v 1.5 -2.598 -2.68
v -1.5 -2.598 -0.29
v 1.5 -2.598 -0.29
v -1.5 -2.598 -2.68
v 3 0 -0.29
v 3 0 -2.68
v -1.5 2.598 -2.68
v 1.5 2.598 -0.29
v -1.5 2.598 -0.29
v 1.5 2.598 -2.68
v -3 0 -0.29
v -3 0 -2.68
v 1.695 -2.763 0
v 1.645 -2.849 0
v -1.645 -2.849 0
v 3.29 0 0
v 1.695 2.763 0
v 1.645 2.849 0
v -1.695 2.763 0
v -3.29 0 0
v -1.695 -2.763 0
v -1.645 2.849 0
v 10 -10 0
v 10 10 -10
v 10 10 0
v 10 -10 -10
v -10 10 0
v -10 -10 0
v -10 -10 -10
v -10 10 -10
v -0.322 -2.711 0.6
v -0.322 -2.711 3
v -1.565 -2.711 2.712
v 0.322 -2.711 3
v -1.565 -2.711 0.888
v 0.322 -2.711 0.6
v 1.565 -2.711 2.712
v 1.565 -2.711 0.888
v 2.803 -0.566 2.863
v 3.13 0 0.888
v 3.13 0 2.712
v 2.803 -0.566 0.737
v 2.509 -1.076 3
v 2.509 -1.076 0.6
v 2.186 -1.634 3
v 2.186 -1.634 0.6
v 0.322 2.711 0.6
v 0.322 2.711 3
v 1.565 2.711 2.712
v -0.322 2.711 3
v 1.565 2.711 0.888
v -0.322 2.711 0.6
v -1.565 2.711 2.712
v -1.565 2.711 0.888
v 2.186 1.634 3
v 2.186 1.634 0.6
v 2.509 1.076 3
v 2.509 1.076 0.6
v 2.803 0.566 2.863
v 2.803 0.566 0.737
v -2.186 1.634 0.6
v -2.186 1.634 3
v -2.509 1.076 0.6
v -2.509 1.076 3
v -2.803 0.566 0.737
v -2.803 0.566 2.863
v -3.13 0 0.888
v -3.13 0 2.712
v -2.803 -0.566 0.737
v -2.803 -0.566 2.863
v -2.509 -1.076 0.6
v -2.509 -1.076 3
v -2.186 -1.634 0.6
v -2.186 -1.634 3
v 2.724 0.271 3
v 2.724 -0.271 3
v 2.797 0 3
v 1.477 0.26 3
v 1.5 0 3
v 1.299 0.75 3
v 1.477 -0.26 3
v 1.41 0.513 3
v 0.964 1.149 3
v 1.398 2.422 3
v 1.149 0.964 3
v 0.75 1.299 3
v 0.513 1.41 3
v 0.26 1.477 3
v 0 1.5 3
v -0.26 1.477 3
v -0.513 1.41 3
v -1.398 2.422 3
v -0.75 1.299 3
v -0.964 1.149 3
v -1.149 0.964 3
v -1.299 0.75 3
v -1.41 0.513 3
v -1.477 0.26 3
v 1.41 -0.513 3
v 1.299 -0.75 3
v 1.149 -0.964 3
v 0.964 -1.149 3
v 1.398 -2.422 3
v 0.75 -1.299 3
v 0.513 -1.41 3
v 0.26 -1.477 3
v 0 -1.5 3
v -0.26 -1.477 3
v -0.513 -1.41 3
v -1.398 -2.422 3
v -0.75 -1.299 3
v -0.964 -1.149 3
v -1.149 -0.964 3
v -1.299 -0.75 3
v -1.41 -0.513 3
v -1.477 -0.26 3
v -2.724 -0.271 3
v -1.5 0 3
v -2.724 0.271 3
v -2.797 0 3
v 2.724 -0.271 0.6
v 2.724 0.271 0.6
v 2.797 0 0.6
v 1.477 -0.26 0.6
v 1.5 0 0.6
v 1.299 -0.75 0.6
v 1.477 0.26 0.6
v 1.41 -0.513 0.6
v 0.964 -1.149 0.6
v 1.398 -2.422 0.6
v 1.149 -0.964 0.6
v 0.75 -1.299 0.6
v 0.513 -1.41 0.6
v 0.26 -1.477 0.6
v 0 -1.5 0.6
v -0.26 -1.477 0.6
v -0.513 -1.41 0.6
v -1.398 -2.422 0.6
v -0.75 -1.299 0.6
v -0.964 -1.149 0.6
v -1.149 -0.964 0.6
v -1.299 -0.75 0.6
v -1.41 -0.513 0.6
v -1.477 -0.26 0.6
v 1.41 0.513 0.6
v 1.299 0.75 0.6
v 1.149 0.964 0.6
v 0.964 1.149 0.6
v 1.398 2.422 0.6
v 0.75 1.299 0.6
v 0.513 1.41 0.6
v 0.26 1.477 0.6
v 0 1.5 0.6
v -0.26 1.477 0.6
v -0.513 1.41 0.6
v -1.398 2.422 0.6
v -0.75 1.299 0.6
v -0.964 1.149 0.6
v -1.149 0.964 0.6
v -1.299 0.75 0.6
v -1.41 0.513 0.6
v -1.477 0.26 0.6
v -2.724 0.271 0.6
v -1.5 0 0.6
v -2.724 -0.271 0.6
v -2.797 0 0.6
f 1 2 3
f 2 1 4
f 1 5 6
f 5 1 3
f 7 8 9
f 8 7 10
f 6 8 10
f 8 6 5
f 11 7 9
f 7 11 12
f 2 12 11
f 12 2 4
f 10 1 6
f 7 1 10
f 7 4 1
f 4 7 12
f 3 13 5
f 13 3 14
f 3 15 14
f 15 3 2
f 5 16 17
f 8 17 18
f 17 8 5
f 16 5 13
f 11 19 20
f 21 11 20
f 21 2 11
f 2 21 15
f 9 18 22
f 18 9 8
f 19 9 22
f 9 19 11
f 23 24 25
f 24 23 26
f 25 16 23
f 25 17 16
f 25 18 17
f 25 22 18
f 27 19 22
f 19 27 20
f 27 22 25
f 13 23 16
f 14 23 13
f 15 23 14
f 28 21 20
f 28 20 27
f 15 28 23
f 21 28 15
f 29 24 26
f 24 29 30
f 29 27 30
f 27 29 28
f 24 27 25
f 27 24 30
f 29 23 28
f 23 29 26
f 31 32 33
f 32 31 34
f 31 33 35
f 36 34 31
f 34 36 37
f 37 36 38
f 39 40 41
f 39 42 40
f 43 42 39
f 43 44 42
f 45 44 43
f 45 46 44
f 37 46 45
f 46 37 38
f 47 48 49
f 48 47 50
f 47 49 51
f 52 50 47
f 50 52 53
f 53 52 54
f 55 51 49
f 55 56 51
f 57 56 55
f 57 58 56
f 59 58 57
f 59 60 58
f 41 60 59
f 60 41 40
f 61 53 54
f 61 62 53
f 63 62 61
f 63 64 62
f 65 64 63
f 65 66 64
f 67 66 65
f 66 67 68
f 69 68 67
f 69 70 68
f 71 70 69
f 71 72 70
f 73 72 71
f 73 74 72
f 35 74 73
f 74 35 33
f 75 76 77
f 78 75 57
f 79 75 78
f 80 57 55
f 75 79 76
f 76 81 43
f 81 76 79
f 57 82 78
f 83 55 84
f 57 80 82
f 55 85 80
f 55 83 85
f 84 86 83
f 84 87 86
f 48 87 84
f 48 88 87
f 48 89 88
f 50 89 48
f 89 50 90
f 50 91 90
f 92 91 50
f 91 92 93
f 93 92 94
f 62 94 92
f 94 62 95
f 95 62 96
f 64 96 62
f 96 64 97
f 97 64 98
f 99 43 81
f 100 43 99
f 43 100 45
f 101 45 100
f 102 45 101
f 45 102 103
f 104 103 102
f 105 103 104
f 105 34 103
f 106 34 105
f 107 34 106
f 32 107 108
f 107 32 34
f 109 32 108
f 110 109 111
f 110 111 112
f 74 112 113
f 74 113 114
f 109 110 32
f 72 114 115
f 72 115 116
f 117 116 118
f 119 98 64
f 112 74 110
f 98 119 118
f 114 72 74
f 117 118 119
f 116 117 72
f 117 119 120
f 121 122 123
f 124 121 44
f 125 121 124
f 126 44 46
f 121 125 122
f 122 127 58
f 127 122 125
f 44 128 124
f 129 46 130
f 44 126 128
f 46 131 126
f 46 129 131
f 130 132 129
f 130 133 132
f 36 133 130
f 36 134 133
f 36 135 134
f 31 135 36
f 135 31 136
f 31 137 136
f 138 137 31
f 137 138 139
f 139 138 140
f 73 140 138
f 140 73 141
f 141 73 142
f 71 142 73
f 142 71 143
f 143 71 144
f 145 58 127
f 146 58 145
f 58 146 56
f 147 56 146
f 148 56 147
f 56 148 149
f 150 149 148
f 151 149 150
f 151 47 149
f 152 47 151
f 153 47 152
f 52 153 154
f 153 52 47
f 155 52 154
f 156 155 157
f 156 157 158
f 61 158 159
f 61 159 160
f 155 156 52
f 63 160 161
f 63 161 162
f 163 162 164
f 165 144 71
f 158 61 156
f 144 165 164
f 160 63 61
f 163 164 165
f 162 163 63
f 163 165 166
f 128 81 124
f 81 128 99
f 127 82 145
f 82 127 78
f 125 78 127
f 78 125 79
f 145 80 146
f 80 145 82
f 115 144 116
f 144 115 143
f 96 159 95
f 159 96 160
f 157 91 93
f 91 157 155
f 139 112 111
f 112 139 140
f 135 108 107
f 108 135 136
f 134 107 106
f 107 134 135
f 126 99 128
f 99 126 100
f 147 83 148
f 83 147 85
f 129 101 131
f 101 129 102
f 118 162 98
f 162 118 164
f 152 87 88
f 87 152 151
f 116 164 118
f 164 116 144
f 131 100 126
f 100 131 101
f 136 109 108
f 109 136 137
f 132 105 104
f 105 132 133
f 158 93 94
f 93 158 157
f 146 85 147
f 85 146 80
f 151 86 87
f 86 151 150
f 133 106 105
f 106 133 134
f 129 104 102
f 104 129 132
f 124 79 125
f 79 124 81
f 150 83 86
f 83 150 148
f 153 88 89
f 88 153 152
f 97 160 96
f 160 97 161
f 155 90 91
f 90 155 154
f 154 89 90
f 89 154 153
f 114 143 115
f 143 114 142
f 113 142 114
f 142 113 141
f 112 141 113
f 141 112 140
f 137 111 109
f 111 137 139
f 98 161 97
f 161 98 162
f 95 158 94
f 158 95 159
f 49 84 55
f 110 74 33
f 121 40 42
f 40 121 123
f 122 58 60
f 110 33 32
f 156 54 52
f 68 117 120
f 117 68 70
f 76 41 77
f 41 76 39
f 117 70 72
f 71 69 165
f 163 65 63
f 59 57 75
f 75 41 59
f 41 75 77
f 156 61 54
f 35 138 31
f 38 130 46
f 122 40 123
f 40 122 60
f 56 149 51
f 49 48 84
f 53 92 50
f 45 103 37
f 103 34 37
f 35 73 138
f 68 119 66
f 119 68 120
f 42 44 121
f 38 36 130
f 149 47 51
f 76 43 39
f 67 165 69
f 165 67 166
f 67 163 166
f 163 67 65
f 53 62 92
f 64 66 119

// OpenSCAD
fn = 36;

module M3(length) {
   color("DimGray")
	union(){
	translate([0, 0, 0]) cylinder(h = length, r = 1.5, center = false, $fn = fn);
	render() difference() {
		translate([0, 0, length]) cylinder(h = 3, r = 2.8, center = false, $fn = fn);
		translate([0, 0, length + 1.71]) cylinder(h = 1.3, r = 1.25, center = false, $fn = 6);
	}
  }
}


module M3Hole() {
  translate([0, 0, 2.0]) cylinder(h=3.03, d=6, $fn = fn);	
  translate([0, 0, 0.0]) cylinder(h=2.02, d=3, $fn = fn);	
}


module M3Nut() render(){
   translate([0,0,-1.2])
	intersection() {
		scale([1, 1, 0.5]) sphere(r = 3.75, center = true);
		difference() {
  			cylinder (h = 2.4, r = 3.13, center = true, $fn = 6);
			cylinder(h = 2.4 + 0.1, r = 1.5, center = true, $fn = fn);
		}
  }

}

module M3NutHole() {
  translate([0,0,-2.7])
  union() {
   cylinder(h=2.4, r=3, $fn = 6);	
	translate([0,0,2.39]) cylinder(h=0.3, r1=3, r2=3.3, $fn = 6);	
  }
}


module M3Knob() 
{
  color("lightblue")
  translate([0,0,-1])
  union() {
    difference() {
      cylinder(h=5, r1=4, r2=4.8, $fn=36); 
      translate([0,0,-0.01]) cylinder(h=4.02, r=2.75, $fn=36); 
    }
    translate([0,0,2.7]) cylinder(h=1.3, r=1.2, $fn=6);
    translate([0,0,5]) difference() {
      cylinder(h=2, r=6.5, $fn=36);
      union() {
        for(i = [0:7]) {
          assign (alpha = i * 360 / 8)
          rotate(alpha, [0, 0, 1])
          translate([0,7.5,-0.01]) cylinder(h=2.02, r=2, $fn=36);
        }
      }
    }
  }
}

difference() {
translate([-10,-10,-10]) cube([20, 20, 10]);
translate([0,0,0.02]) M3NutHole();
}
translate([0,0,3]) M3Nut();
